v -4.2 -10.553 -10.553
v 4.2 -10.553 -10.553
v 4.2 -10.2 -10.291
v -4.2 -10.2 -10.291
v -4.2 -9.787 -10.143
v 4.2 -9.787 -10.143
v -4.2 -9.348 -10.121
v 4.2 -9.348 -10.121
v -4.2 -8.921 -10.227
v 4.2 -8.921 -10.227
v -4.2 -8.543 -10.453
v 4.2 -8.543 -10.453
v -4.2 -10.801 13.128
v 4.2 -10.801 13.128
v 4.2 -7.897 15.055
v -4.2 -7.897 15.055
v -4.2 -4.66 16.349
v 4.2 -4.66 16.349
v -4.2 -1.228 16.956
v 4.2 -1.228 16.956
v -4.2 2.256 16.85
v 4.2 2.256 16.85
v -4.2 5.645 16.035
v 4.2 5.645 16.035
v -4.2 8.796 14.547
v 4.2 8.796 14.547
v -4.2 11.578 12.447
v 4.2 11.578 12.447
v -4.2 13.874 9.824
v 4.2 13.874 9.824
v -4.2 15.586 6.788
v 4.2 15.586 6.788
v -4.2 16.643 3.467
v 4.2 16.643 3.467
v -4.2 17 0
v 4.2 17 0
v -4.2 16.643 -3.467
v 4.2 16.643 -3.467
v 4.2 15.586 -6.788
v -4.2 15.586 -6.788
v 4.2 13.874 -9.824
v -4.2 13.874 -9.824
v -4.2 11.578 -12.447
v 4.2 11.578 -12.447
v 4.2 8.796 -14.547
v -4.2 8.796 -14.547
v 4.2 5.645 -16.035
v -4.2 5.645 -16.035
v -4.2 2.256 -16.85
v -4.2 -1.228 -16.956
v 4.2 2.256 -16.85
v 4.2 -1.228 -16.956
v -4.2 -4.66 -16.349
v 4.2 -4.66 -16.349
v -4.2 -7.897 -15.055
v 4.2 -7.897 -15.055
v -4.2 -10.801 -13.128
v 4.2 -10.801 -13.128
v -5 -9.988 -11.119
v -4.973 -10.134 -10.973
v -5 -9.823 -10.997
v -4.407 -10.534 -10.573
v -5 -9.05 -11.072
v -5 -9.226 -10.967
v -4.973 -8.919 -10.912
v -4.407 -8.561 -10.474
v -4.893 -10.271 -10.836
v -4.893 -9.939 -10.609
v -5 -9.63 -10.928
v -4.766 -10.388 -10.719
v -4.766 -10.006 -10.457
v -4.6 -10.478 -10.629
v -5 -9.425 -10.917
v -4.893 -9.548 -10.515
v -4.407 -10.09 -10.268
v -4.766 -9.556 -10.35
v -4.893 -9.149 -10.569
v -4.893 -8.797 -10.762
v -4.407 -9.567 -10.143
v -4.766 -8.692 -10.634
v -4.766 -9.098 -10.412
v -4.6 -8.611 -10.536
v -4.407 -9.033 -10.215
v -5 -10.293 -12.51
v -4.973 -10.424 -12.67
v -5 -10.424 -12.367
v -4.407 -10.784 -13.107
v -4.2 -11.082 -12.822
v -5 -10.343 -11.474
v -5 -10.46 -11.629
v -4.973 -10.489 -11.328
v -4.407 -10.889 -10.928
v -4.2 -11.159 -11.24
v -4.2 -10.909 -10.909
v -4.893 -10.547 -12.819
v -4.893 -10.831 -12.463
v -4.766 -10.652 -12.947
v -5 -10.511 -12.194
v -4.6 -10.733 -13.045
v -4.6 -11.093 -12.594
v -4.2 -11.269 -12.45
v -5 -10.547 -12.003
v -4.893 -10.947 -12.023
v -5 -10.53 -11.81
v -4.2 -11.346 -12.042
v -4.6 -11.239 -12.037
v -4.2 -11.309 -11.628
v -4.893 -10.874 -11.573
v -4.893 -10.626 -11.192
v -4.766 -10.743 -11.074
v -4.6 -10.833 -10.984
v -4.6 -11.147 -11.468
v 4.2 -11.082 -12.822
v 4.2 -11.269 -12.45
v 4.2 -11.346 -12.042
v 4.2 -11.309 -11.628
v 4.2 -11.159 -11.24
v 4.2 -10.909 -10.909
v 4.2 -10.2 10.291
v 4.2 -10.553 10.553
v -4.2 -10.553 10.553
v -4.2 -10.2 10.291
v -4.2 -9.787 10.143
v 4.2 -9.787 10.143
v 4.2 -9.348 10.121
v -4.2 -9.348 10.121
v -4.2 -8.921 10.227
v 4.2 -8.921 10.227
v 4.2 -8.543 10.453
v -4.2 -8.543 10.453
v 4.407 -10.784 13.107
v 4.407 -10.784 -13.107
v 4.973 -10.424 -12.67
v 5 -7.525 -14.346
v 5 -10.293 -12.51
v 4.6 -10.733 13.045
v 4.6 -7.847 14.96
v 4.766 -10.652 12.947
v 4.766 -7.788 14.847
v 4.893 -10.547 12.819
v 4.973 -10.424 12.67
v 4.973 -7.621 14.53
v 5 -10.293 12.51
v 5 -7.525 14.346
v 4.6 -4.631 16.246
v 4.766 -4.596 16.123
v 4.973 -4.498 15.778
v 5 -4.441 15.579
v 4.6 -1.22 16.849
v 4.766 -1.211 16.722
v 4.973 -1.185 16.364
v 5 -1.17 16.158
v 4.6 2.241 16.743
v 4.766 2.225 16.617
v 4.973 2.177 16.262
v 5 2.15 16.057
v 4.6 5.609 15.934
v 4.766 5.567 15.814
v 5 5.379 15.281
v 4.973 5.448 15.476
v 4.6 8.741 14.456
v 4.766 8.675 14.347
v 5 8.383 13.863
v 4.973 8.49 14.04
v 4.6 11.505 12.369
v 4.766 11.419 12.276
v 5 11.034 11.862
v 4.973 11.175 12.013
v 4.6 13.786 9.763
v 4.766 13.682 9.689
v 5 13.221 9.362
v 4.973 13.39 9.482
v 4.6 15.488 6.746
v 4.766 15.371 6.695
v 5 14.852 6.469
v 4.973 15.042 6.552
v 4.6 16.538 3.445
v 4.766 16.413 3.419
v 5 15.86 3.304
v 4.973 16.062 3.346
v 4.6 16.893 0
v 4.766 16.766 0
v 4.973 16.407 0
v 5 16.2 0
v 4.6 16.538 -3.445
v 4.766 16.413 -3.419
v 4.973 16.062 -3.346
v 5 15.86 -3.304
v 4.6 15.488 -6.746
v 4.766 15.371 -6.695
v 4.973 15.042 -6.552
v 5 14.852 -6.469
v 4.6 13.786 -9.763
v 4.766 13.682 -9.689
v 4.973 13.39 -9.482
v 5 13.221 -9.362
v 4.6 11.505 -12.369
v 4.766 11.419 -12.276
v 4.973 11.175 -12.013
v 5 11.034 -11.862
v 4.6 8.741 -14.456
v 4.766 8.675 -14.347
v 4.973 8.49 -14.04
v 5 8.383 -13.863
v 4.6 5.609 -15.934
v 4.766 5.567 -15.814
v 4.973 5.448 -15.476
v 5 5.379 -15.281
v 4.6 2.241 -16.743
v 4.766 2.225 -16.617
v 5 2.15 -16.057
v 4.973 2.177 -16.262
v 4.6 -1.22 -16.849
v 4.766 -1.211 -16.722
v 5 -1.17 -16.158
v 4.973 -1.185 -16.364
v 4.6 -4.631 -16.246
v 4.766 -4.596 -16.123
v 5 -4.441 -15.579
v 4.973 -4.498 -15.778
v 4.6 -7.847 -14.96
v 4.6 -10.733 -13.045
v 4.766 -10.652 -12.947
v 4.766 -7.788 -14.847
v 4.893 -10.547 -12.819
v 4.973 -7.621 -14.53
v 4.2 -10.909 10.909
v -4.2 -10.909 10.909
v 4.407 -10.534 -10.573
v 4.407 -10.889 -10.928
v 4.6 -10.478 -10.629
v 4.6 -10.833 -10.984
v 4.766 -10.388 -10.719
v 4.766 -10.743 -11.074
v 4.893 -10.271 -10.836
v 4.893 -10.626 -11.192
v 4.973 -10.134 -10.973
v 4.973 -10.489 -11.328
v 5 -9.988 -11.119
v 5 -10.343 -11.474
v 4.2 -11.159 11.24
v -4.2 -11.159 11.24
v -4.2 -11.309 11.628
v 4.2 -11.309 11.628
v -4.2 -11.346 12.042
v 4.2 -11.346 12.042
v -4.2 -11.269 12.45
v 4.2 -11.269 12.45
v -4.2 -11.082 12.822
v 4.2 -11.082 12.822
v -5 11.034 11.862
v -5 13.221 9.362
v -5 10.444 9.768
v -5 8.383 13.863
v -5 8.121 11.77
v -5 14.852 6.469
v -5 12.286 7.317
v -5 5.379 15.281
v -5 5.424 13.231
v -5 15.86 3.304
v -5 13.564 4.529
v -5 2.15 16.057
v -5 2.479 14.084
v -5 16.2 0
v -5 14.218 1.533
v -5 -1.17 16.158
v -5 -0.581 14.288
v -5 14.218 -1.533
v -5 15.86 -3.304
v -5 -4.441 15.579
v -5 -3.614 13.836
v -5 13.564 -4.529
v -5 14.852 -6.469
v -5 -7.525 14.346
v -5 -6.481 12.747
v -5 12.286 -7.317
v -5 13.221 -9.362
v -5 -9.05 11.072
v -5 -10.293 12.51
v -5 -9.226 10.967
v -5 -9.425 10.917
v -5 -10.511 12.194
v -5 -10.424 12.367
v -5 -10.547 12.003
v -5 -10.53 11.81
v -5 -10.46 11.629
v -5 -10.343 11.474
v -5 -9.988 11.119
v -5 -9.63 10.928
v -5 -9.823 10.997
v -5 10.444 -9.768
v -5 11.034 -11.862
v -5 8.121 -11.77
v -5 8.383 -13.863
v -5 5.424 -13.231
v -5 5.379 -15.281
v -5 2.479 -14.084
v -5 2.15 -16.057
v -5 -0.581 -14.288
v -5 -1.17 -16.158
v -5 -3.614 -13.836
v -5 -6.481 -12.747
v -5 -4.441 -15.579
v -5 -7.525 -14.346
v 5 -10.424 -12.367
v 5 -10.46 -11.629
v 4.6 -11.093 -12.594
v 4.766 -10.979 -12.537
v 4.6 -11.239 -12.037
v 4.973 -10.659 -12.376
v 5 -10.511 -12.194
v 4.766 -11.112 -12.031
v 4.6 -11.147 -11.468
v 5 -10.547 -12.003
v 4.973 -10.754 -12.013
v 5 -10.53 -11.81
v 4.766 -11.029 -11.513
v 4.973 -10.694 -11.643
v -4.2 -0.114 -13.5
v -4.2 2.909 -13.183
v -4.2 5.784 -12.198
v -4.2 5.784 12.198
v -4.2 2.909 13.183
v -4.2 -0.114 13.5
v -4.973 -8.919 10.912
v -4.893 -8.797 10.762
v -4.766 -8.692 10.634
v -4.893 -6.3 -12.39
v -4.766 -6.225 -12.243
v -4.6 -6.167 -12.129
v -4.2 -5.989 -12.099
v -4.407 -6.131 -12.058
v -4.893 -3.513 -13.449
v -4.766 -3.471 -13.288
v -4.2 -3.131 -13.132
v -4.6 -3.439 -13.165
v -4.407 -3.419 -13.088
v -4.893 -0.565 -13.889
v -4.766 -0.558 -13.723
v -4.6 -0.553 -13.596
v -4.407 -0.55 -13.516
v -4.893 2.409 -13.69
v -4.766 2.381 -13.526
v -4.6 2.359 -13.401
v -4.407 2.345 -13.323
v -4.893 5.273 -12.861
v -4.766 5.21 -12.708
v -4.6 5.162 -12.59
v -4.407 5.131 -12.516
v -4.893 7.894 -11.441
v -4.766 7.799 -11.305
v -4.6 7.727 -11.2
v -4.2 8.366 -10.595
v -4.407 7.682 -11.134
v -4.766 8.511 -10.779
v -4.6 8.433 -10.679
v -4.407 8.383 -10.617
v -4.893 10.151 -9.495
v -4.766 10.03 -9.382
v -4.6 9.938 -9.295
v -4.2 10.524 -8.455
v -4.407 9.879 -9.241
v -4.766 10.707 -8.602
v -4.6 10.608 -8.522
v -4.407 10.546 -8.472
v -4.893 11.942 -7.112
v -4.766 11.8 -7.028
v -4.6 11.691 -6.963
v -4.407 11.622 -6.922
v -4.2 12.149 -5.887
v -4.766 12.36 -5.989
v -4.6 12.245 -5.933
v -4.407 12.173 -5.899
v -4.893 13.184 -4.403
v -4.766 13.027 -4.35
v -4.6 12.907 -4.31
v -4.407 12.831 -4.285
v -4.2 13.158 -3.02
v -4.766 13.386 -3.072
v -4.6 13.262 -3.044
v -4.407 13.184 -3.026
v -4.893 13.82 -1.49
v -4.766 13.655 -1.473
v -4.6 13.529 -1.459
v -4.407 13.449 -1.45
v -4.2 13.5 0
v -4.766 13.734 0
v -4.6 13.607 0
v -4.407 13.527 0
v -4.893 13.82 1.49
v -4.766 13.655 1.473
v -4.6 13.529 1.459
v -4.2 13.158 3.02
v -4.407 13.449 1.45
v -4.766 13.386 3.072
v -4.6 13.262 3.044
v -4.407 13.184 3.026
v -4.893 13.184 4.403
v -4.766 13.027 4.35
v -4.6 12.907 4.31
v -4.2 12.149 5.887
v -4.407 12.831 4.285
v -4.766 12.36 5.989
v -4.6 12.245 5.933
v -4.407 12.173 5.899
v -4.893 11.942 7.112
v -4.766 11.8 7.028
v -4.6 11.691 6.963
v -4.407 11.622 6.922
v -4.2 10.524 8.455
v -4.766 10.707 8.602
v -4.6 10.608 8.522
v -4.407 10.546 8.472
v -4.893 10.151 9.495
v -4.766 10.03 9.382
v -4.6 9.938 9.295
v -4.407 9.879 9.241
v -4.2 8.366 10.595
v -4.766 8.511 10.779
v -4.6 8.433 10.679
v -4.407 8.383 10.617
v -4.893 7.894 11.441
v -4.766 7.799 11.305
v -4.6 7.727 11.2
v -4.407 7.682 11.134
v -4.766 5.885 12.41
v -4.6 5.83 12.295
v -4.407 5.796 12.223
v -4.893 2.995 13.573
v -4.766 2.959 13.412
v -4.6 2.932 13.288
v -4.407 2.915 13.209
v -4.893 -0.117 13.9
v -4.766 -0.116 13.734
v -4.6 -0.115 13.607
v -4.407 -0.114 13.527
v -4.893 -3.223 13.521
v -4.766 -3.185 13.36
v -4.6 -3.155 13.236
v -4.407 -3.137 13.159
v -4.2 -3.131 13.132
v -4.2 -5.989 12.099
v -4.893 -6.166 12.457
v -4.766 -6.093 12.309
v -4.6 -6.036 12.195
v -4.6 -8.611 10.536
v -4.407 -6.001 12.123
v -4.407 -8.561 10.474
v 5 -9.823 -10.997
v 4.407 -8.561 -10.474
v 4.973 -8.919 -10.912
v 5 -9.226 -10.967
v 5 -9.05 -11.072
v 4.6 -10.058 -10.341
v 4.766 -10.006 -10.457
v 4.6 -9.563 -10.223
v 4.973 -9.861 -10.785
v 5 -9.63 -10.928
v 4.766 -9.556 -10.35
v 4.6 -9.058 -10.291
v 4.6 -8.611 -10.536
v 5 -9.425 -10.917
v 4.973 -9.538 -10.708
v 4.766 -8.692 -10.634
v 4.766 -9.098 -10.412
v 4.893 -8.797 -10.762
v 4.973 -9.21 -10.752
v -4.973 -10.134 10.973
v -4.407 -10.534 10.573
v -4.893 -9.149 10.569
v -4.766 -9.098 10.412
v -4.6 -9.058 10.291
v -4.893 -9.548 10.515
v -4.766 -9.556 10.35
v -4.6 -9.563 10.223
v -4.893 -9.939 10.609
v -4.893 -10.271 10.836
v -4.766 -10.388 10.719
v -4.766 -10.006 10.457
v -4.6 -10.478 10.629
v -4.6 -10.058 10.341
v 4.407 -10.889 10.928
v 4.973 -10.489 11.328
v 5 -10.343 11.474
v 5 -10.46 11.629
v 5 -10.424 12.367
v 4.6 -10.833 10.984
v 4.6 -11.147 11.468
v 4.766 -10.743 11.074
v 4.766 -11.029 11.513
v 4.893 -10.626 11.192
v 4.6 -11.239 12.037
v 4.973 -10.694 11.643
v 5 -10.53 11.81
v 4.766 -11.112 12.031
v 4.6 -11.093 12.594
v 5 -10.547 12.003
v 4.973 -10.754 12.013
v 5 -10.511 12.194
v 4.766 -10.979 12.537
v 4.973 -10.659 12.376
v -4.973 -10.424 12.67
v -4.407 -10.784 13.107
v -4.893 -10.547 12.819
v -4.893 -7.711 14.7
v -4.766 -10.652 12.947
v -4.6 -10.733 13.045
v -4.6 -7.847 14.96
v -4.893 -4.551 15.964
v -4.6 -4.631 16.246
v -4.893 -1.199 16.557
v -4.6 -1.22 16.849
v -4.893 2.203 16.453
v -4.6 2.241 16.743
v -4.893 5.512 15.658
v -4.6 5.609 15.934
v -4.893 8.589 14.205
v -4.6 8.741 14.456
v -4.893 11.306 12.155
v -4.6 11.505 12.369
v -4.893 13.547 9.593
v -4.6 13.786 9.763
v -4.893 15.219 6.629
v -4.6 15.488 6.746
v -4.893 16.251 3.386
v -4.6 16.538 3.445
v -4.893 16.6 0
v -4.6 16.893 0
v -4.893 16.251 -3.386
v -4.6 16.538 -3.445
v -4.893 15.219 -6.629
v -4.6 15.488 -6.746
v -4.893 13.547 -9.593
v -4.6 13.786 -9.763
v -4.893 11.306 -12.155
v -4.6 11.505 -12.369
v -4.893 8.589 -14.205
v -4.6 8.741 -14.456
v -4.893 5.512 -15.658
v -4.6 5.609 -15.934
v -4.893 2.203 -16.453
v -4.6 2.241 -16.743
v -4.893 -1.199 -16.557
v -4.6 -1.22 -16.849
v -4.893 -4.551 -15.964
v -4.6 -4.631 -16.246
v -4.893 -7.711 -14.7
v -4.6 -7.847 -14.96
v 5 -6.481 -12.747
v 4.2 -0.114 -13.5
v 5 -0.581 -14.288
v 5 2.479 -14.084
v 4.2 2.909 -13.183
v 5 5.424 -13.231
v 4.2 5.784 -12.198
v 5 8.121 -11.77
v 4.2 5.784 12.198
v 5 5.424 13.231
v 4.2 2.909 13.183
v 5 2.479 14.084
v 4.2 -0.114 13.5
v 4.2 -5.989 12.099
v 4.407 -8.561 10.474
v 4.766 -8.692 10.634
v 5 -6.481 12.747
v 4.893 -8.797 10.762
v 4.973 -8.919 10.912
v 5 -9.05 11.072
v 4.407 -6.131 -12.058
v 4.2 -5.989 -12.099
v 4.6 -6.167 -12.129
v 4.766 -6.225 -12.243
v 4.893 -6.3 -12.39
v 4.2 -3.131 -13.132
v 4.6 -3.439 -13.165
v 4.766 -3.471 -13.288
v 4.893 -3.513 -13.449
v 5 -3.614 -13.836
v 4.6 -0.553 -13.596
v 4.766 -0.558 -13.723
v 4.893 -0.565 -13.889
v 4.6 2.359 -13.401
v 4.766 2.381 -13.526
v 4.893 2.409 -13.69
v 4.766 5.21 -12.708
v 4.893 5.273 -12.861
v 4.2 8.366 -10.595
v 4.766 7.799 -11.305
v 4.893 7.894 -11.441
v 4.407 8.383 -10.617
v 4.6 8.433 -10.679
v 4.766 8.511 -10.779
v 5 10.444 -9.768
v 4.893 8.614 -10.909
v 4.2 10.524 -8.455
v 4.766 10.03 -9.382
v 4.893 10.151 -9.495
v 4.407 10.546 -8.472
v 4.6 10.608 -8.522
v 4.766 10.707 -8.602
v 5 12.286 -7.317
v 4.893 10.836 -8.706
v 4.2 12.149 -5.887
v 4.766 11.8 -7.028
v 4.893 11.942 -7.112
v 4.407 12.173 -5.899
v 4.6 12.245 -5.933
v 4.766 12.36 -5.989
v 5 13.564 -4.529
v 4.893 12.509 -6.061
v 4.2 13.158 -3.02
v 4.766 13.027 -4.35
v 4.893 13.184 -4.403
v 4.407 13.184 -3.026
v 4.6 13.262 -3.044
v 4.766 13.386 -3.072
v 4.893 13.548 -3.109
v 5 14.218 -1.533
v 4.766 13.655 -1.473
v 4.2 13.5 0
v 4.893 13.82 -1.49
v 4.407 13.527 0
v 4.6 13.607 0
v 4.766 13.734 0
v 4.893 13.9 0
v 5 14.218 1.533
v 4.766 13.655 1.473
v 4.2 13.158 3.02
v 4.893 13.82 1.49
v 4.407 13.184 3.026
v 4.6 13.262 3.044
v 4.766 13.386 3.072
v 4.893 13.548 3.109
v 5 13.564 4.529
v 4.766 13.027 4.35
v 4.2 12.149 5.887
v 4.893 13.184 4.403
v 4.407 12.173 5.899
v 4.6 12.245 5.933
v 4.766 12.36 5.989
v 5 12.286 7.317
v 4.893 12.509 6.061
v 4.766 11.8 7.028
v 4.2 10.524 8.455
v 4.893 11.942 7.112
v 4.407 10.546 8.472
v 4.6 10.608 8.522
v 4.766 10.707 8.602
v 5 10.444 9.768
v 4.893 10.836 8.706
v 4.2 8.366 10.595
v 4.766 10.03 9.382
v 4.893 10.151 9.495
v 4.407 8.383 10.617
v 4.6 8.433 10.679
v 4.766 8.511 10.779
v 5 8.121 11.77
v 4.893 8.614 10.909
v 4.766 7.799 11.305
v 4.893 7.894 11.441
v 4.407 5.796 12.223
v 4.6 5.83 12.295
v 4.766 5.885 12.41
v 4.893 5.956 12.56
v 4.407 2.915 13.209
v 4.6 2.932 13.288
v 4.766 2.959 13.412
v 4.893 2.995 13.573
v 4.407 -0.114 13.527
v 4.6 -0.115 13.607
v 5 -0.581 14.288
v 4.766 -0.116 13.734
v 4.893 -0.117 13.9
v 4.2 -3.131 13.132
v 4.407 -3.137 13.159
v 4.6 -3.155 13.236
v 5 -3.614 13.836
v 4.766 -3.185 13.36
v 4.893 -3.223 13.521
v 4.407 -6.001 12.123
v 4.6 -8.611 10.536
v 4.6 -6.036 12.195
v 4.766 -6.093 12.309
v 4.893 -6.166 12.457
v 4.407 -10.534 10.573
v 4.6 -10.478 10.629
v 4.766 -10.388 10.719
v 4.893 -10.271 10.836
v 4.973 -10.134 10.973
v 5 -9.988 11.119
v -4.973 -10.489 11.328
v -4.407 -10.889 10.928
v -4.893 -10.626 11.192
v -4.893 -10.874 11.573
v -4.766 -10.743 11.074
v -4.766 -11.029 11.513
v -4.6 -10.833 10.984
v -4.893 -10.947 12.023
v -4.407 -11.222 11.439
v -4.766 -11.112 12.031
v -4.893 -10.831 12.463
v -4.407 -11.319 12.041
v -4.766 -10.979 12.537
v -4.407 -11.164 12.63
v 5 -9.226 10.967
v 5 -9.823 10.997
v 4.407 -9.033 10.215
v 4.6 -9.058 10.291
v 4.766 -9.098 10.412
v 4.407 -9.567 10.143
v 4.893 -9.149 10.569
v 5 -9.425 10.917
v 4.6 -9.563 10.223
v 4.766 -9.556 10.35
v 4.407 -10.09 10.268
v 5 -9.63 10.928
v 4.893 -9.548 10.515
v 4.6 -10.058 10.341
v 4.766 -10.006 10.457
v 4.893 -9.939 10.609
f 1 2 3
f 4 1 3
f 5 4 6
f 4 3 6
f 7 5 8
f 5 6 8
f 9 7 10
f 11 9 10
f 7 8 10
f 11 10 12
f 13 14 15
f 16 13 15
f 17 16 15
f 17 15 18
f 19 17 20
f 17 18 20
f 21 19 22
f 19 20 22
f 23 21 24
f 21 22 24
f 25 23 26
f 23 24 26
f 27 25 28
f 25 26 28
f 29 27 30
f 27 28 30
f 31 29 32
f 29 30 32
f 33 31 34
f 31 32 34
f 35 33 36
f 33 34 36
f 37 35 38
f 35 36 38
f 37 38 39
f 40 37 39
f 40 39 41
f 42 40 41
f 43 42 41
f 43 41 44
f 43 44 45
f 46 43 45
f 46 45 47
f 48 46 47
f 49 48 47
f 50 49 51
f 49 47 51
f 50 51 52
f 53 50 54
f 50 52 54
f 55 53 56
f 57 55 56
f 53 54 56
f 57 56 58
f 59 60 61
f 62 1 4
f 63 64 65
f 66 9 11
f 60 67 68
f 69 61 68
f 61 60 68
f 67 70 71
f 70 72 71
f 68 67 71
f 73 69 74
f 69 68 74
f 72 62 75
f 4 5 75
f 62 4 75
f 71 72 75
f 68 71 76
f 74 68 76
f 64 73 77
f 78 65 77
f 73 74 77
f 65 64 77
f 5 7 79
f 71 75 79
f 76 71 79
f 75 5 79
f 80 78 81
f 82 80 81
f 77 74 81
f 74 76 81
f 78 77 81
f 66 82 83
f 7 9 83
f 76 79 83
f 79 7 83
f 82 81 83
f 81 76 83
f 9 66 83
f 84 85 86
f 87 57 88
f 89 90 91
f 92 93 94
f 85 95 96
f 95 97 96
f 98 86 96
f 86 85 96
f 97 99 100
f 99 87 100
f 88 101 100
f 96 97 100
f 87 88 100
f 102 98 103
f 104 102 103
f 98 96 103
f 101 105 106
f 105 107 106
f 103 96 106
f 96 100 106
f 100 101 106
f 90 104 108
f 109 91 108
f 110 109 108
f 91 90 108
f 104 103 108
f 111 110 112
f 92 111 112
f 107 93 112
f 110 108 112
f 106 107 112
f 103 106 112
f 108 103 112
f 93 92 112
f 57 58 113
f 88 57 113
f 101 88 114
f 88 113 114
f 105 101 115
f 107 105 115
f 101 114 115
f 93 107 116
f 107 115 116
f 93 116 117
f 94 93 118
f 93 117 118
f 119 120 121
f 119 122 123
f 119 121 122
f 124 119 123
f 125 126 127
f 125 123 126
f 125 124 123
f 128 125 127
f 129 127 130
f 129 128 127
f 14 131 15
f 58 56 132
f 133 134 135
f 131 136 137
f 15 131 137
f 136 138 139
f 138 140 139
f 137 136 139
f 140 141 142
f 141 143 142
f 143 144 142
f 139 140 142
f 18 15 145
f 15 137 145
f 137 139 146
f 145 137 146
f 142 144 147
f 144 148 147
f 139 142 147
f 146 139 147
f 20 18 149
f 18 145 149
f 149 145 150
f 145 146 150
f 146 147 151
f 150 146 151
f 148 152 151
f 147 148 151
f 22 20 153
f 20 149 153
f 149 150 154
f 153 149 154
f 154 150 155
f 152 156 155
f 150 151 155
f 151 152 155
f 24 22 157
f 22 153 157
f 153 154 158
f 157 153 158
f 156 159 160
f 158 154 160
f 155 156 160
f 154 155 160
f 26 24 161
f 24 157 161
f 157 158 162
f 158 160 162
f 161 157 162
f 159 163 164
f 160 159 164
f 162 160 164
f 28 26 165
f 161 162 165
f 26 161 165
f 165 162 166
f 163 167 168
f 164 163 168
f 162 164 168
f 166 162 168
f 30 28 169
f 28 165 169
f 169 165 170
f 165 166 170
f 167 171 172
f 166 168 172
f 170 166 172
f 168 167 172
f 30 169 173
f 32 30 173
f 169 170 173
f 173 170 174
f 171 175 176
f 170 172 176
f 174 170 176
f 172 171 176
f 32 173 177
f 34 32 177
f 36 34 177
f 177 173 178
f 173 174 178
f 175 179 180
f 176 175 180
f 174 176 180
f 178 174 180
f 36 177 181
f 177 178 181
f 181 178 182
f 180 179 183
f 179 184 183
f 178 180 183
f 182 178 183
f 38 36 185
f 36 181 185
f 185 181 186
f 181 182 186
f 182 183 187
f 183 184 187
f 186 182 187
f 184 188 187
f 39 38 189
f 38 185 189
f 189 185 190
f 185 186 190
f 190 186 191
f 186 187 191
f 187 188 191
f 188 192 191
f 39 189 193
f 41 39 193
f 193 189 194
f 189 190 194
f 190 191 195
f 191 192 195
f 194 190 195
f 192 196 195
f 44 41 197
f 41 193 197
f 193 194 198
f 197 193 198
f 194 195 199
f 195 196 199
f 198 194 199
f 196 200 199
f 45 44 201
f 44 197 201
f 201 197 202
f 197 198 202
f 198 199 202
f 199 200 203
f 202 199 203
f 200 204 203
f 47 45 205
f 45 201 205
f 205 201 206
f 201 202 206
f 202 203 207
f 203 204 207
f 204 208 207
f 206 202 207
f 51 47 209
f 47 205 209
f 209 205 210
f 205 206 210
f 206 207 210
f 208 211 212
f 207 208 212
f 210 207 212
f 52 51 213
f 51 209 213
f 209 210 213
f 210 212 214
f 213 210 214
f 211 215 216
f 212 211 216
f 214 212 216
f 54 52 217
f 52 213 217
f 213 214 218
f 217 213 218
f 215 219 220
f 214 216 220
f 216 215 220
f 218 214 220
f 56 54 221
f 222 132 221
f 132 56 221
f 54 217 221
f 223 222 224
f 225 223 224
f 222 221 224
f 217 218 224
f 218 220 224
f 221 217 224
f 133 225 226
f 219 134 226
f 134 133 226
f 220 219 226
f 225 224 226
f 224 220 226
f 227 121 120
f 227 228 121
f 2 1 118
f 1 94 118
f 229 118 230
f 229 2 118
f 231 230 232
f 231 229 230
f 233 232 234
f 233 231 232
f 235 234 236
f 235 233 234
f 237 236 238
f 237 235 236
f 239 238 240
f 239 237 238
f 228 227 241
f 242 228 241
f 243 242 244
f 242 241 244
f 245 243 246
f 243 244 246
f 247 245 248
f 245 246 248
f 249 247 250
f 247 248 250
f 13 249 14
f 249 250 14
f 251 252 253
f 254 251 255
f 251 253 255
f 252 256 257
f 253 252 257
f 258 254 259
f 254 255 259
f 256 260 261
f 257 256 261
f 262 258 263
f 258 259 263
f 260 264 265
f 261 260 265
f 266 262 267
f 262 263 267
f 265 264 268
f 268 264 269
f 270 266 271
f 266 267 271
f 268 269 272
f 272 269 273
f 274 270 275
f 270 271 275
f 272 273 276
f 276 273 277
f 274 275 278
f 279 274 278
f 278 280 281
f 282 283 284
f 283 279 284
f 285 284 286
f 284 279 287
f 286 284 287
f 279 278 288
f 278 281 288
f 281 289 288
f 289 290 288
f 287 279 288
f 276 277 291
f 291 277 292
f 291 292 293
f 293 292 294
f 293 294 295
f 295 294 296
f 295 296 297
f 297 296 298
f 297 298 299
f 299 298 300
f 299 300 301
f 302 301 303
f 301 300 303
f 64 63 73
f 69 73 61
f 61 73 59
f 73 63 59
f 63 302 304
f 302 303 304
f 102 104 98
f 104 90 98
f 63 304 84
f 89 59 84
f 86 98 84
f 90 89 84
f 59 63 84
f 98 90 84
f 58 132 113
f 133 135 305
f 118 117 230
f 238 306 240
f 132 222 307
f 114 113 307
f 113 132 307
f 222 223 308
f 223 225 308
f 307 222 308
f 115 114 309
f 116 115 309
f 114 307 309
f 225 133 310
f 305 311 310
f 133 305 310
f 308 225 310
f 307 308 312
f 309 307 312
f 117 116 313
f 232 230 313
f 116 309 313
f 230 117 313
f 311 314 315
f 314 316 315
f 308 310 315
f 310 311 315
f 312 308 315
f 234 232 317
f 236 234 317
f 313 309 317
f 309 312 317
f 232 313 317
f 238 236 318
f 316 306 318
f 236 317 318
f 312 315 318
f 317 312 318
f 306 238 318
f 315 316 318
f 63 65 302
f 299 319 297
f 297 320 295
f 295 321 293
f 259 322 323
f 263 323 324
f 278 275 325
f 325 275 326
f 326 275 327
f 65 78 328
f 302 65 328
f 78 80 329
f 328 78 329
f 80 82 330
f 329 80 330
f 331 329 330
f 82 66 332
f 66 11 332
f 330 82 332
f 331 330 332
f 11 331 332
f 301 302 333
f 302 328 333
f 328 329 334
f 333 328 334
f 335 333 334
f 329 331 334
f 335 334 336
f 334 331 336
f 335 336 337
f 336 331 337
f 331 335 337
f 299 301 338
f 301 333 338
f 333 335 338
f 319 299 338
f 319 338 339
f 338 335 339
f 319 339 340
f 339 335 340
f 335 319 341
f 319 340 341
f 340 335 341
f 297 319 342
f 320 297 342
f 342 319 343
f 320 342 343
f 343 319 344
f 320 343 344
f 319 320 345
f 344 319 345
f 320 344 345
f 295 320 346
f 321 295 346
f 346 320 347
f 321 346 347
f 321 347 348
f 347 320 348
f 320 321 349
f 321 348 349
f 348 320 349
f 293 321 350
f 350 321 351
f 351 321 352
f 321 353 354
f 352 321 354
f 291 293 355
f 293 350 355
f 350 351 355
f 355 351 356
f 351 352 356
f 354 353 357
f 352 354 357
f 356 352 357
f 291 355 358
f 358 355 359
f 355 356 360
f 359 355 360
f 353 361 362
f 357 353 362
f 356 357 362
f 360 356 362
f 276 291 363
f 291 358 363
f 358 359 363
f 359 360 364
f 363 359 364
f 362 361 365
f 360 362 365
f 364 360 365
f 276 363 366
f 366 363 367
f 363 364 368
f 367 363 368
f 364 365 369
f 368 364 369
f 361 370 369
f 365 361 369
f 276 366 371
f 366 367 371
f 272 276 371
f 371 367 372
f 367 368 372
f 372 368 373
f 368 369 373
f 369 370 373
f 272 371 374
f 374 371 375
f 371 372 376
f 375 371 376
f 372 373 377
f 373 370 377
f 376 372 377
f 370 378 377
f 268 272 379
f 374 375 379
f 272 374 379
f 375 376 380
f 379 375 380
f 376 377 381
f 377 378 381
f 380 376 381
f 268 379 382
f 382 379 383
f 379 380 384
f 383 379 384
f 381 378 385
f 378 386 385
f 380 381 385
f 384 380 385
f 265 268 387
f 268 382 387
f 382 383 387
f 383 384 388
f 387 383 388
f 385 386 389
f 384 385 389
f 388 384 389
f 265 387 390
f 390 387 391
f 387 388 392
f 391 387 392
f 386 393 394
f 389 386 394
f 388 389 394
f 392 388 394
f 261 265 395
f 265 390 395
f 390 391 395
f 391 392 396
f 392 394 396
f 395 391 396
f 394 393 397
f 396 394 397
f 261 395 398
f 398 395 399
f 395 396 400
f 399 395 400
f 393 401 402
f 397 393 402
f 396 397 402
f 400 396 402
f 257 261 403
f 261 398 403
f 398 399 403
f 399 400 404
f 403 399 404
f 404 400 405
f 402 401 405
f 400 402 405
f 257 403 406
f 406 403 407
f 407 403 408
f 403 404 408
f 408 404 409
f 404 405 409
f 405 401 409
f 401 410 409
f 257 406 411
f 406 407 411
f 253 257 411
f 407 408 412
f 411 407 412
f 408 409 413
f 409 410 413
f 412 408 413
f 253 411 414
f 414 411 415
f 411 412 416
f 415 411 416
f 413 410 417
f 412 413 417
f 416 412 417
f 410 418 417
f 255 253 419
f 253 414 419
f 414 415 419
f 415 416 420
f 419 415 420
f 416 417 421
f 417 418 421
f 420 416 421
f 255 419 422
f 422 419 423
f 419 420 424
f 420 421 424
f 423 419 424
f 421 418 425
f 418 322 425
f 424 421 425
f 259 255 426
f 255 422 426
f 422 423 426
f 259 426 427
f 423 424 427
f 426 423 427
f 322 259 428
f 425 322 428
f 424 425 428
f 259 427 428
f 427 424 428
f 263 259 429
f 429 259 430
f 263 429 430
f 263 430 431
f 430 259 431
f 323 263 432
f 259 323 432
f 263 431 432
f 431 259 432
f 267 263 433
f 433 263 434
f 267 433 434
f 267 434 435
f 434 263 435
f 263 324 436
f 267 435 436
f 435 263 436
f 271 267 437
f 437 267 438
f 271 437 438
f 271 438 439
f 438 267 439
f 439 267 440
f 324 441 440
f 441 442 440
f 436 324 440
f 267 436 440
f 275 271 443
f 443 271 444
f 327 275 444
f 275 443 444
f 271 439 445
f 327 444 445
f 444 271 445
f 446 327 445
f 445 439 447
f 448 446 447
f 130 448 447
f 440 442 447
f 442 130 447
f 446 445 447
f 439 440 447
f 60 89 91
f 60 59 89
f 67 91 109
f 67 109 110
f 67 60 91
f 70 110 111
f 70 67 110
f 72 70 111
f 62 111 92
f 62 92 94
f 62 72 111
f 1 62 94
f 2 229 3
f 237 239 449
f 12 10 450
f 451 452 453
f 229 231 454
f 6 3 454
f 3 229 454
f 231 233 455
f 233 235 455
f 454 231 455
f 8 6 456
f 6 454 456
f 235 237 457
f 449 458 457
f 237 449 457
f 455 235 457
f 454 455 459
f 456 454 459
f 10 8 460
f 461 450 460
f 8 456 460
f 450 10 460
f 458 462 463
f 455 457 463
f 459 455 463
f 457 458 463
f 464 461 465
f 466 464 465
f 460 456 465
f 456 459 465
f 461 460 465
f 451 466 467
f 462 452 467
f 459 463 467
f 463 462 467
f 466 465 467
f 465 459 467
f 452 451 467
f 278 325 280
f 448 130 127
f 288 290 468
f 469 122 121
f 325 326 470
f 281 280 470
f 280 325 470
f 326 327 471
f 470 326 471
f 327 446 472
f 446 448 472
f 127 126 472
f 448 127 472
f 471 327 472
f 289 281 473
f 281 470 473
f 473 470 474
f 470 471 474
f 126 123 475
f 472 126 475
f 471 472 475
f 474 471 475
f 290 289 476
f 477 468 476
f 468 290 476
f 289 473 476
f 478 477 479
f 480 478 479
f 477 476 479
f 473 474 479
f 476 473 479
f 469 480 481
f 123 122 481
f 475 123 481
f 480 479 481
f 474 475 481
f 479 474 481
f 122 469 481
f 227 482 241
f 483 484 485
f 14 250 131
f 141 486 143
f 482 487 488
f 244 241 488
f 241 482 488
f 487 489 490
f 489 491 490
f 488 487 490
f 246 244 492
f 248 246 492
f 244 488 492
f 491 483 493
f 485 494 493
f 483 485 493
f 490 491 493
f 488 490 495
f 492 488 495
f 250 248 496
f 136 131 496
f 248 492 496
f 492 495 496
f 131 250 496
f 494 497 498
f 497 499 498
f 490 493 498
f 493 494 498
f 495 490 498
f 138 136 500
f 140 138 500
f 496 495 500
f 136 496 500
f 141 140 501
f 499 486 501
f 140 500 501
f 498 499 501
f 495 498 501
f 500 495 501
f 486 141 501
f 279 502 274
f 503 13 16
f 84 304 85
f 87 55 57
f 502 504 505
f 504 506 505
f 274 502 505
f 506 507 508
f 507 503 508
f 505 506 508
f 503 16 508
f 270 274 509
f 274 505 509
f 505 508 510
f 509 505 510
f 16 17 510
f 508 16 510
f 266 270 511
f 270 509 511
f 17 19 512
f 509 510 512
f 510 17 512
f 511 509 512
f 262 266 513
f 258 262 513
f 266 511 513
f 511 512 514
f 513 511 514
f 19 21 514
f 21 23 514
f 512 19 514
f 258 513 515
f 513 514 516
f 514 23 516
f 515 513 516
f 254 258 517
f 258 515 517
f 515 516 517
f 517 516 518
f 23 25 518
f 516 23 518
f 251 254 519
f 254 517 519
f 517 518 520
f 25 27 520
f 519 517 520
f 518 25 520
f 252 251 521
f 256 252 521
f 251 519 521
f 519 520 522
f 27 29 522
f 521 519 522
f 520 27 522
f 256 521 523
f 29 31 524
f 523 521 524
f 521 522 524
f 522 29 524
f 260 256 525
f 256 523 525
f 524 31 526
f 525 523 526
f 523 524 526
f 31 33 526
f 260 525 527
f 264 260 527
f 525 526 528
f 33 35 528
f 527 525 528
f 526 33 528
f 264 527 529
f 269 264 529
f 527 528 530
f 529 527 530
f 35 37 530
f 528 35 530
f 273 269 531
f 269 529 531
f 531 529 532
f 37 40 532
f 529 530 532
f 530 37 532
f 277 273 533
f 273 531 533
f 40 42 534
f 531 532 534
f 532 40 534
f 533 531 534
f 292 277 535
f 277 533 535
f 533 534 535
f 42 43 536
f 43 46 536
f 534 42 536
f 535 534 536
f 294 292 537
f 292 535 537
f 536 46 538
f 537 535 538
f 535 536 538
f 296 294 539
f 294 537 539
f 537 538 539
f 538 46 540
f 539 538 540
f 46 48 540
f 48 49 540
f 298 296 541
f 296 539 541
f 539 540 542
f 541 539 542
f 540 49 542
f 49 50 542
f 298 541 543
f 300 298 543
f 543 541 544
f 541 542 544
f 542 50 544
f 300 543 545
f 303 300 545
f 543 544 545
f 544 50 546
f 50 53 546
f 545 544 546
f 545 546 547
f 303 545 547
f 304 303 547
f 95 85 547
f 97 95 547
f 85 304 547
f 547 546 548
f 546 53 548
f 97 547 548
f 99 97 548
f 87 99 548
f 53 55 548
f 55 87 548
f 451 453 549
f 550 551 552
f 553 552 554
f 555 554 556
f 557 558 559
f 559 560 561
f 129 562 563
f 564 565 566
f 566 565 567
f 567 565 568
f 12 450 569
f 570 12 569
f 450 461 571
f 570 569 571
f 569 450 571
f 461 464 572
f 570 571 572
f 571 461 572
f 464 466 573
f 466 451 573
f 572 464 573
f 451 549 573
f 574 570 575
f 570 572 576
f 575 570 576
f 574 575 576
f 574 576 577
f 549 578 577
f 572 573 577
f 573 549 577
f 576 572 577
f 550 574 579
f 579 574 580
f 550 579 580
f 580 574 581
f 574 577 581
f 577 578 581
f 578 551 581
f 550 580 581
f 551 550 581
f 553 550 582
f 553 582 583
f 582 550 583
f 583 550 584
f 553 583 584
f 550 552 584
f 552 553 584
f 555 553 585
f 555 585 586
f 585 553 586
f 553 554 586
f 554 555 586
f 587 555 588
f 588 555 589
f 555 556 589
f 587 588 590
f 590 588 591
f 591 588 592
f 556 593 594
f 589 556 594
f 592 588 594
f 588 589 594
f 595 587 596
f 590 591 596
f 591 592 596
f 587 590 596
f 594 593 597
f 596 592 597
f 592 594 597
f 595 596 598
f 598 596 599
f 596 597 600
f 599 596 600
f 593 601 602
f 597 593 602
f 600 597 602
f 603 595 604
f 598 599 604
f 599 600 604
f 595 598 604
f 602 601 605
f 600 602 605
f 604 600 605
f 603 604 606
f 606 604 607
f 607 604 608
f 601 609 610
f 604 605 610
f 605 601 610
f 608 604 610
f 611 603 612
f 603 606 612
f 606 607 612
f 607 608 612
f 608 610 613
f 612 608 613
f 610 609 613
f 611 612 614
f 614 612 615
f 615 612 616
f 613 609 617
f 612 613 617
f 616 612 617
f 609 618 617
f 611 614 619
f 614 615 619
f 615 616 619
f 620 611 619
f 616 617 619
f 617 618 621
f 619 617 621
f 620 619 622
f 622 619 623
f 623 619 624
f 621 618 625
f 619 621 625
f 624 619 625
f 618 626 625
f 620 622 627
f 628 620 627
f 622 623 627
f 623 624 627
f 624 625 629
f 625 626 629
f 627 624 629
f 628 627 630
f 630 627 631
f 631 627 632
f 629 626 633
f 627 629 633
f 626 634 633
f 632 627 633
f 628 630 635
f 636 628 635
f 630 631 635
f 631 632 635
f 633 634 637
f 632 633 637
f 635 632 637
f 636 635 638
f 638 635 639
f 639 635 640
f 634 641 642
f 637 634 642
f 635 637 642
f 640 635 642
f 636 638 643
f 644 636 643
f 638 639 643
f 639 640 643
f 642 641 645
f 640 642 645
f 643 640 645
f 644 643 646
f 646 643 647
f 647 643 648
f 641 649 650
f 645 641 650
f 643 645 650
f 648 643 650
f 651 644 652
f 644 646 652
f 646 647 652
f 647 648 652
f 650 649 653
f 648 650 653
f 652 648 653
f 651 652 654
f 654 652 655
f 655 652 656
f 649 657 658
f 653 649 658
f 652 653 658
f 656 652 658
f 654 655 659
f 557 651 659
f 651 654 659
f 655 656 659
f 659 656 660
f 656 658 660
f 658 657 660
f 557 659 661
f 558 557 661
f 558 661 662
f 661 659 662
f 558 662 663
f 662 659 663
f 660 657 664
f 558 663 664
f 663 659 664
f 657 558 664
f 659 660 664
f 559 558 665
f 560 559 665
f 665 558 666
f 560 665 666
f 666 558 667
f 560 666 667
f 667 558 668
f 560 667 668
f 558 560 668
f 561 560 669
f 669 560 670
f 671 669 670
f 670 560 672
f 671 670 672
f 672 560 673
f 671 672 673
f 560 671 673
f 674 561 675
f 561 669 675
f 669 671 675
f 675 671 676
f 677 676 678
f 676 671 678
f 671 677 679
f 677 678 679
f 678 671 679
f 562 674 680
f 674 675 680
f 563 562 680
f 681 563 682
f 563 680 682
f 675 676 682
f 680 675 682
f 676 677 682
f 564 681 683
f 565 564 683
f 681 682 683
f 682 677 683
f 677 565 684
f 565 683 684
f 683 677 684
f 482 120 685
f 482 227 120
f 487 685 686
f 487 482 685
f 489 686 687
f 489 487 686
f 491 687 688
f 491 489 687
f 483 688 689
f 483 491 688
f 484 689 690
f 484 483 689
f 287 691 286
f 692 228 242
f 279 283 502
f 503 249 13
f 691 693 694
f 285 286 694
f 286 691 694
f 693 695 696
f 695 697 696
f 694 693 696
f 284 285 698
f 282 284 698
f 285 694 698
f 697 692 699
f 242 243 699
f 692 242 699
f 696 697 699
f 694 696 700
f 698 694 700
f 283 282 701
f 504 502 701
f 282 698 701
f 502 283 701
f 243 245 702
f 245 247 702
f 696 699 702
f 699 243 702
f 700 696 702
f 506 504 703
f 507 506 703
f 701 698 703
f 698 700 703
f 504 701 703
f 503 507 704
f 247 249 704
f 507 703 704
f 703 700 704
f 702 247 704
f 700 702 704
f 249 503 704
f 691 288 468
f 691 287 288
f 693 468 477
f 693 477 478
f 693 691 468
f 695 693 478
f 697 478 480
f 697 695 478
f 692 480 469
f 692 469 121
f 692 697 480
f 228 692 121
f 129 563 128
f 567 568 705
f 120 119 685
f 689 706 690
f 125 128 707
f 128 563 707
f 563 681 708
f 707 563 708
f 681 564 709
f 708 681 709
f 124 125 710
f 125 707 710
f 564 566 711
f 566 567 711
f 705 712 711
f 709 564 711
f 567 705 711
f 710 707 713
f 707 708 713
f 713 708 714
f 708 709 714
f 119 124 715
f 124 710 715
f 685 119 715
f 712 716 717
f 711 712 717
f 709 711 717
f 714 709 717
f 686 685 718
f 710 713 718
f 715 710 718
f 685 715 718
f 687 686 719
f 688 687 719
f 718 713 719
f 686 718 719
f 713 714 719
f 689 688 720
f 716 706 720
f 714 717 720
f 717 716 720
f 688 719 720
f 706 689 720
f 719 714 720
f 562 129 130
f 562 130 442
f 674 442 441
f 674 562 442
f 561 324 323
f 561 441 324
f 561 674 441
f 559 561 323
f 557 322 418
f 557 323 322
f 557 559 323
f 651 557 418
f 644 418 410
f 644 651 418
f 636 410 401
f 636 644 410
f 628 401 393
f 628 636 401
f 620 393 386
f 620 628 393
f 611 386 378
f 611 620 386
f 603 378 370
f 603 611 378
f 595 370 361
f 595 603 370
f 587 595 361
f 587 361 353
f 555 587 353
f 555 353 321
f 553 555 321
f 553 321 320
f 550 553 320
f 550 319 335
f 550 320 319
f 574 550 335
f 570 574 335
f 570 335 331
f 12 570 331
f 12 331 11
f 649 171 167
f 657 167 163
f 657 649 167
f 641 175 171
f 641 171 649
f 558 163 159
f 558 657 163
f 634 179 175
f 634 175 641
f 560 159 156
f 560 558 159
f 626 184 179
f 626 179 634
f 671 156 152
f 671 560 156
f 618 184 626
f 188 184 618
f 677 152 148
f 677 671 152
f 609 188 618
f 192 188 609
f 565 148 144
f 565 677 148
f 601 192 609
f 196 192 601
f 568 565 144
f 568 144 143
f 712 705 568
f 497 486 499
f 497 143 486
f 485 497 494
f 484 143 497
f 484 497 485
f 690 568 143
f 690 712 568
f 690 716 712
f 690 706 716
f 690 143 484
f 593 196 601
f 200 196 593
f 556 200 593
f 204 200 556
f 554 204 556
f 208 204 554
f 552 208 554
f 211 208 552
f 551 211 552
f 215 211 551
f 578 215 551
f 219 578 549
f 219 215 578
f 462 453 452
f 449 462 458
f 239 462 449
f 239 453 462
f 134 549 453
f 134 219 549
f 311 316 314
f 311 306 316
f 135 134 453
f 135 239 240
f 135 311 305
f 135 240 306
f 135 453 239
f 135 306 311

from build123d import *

# Parameters (mm, degrees)
SKIZZE1_W       = 10
SKIZZE1_H       = 3.5
ROTATION1_ANGLE = 270
VERRUNDUNG1_R   = 1.5
VERRUNDUNG2_R   = 0.8


with BuildPart() as part:
    # Skizze1 → Rotation1 (revolve, symmetric)
    with BuildSketch(Plane.XY) as rotation1_sk:
        with Locations((0, 15.25)):
            Rectangle(SKIZZE1_W, SKIZZE1_H)
    revolve(axis=Axis((-29.230918038, 0, 0), (1, 0, 0)), revolution_arc=ROTATION1_ANGLE / 2)
    revolve(rotation1_sk.sketch, axis=Axis((-29.230918038, 0, 0), (-1, 0, 0)), revolution_arc=ROTATION1_ANGLE / 2)

    # Verrundung1
    verrundung1_edges = [part.edges().sort_by_distance(p)[0] for p in [
        (0, -9.545941546, 9.545941546),
        (0, -12.02081528, -12.02081528),
        (0, -9.545941546, -9.545941546),
        (0, -12.02081528, 12.02081528),
    ]]
    fillet(verrundung1_edges, radius=VERRUNDUNG1_R)

    # Verrundung2
    verrundung2_edges = [part.edges().sort_by_distance(p)[0] for p in [
        (5, 17, 0),
        (-5, 17, 0),
        (-5, -10.731073787, -10.731073787),
        (-5, 13.5, 0),
        (-5, -10.731073787, 10.731073787),
        (-5, -11.346290795, 12.042038249),
        (-5, -9.56786945, 10.115976522),
        (-5, -9.56786945, -10.115976522),
        (-5, -11.346290795, -12.042038249),
        (5, -10.731073787, -10.731073787),
        (5, 13.5, 0),
        (5, -10.731073787, 10.731073787),
        (5, -11.346290795, 12.042038249),
        (5, -9.56786945, 10.115976522),
        (5, -9.56786945, -10.115976522),
        (5, -11.346290795, -12.042038249),
    ]]
    fillet(verrundung2_edges, radius=VERRUNDUNG2_R)


solid = part.part
